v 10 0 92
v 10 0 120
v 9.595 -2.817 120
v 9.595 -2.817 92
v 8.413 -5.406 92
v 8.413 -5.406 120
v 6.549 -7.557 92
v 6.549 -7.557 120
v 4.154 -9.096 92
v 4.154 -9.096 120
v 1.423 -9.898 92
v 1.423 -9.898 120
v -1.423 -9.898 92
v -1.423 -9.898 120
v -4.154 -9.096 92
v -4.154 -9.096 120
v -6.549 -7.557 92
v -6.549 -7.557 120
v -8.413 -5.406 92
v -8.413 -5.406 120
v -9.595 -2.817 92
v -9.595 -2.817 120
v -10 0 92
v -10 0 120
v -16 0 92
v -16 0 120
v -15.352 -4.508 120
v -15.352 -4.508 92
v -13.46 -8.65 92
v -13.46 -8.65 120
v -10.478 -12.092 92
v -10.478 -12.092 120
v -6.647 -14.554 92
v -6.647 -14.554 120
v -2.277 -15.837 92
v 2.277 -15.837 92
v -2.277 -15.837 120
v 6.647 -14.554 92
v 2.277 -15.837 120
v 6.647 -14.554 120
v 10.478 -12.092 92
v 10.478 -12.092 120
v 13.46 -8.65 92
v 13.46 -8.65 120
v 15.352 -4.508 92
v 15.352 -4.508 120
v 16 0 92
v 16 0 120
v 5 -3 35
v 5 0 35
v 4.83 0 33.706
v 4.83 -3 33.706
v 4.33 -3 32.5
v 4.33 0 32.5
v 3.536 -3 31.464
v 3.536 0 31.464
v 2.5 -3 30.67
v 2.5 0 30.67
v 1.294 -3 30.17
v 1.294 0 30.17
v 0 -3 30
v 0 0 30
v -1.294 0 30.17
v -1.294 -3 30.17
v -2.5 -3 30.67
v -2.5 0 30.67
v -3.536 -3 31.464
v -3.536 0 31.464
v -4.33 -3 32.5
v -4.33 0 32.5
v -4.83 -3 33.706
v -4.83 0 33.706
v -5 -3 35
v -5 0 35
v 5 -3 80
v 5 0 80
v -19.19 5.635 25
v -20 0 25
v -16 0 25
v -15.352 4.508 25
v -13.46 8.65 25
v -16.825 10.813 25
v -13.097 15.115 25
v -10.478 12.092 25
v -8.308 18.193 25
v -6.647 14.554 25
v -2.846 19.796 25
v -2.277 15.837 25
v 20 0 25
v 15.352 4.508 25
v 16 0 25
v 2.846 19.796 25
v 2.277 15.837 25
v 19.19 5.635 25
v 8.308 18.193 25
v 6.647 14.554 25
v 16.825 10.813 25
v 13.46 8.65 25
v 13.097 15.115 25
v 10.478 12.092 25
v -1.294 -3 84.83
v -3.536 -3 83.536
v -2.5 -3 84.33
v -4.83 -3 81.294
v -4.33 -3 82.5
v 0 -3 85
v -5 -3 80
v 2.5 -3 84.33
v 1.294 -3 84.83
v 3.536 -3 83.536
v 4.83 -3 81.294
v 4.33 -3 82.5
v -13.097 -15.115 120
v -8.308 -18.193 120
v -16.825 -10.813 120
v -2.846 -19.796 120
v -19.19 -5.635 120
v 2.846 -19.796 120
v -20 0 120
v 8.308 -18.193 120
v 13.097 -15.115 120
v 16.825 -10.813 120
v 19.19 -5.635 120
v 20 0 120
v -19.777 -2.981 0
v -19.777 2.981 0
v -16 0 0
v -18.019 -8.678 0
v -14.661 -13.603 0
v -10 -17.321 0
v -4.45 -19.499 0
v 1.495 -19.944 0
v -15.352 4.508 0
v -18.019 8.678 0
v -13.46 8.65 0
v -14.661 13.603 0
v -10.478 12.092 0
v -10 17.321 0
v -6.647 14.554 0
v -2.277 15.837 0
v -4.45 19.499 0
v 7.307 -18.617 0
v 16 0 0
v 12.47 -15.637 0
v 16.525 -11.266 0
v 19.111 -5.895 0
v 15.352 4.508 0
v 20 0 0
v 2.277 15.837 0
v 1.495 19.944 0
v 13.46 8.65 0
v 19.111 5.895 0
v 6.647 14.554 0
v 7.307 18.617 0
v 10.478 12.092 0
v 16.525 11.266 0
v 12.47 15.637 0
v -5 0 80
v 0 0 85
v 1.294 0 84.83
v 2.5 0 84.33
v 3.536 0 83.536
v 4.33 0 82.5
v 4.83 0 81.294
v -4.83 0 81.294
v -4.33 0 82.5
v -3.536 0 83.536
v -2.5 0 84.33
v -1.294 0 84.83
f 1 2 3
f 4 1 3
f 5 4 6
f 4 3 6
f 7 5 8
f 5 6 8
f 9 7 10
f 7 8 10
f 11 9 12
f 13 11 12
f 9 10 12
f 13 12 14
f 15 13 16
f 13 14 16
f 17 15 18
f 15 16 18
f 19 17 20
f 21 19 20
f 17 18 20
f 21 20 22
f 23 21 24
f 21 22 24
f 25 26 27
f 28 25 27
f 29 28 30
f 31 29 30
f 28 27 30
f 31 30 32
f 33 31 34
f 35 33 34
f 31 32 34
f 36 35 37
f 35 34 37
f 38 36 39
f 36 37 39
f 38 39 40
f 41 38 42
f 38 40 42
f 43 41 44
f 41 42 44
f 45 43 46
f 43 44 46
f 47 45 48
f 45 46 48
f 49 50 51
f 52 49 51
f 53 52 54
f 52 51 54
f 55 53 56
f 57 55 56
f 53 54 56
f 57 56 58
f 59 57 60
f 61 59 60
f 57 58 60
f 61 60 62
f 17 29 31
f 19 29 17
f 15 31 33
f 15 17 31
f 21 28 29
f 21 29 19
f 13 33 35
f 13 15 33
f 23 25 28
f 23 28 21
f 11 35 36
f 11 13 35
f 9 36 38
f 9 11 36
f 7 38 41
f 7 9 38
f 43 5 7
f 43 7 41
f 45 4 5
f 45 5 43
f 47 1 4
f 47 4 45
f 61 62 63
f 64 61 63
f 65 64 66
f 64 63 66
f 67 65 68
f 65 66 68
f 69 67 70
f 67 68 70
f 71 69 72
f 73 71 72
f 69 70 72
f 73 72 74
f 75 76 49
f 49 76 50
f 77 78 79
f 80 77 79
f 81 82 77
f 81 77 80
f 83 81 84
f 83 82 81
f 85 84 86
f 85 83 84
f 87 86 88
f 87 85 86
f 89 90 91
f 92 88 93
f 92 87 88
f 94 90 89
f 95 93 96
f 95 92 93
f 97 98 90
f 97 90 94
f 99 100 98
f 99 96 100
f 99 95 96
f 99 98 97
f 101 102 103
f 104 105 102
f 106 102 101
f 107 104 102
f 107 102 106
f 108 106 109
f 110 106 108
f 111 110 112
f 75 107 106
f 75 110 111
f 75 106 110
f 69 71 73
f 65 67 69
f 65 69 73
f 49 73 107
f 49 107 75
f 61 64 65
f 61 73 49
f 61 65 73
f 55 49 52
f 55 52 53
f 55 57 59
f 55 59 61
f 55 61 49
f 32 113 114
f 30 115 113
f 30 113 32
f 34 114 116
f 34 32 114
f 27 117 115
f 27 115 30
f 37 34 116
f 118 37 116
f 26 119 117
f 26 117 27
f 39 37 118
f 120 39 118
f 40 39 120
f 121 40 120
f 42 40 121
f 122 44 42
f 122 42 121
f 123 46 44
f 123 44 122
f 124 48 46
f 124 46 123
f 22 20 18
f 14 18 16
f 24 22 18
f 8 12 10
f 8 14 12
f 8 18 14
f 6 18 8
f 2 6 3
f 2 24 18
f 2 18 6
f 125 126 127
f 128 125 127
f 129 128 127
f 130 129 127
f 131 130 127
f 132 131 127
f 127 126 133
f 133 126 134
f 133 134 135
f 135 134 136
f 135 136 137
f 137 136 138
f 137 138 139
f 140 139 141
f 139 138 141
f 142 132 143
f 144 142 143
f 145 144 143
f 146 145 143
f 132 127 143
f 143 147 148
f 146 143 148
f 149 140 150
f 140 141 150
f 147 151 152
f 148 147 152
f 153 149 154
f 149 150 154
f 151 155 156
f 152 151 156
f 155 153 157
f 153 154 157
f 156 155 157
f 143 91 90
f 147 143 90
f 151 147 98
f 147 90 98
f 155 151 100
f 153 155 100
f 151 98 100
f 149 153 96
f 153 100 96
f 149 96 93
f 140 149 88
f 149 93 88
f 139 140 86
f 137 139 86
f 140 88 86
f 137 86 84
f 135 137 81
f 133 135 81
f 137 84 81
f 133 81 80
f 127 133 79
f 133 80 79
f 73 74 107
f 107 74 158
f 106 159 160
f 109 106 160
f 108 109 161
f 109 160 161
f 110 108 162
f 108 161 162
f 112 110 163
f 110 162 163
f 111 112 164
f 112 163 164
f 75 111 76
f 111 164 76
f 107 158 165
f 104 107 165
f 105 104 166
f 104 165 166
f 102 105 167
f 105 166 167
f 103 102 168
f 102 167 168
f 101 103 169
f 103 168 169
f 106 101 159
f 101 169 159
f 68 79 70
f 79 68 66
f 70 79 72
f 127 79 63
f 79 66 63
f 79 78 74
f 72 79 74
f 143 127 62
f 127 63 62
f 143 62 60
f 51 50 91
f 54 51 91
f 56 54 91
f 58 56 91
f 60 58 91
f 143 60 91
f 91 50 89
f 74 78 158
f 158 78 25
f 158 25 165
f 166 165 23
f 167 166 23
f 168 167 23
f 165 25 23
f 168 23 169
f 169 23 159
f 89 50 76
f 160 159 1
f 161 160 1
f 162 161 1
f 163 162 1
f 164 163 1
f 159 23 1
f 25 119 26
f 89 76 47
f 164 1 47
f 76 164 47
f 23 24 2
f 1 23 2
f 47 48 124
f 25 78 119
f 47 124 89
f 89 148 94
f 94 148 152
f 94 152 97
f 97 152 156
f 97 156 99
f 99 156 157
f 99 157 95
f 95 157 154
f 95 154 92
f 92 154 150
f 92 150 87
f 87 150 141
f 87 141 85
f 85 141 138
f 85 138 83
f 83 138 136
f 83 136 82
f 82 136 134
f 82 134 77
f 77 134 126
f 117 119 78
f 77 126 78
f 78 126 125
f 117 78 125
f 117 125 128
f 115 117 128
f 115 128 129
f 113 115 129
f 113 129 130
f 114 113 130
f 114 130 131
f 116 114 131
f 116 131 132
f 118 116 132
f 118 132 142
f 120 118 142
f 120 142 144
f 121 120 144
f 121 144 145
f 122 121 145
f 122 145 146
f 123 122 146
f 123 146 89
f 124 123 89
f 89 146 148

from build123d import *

# Parameters (mm, degrees)
SKETCH2_R           = 20
BOSS_EXTRUDE2_DEPTH = 120
SKETCH2_3_R         = 20
BOSS_EXTRUDE3_DEPTH = 120
CUT_EXTRUDE1_START  = -95
CUT_EXTRUDE1_DEPTH  = 95
CUT_EXTRUDE2_DEPTH  = 100.121138008
CUT_EXTRUDE3_DEPTH  = 28
CUT_EXTRUDE4_DEPTH  = 3


with BuildPart() as part:
    # Sketch2 → Boss-Extrude2 (new body)
    with BuildSketch(Plane.XY):
        Circle(SKETCH2_R)
    extrude(amount=BOSS_EXTRUDE2_DEPTH)

    # Sketch2<3> → Boss-Extrude3 (add)
    with BuildSketch(Plane.XY):
        Circle(SKETCH2_3_R)
    extrude(amount=BOSS_EXTRUDE3_DEPTH)

    # Sketch4 → Cut-Extrude1 (cut)
    with BuildSketch(Plane.XY.offset(120).offset(CUT_EXTRUDE1_START)):
        with BuildLine():
            Line((-20, 0), (20, 0))
            ThreePointArc((20, 0), (0, 20), (-20, 0))
        make_face()
    extrude(amount=CUT_EXTRUDE1_DEPTH, mode=Mode.SUBTRACT)

    # Sketch5 → Cut-Extrude2 (cut, through all)
    with BuildSketch(Plane.XY.offset(25)):
        with BuildLine():
            ThreePointArc((16, 0), (0, 16), (-16, 0))
            Line((-16, 0), (16, 0))
        make_face()
    extrude(amount=-CUT_EXTRUDE2_DEPTH, mode=Mode.SUBTRACT)

    # Sketch6 → Cut-Extrude3 (cut)
    with BuildSketch(Plane.XY.offset(120)):
        with BuildLine():
            Line((-10, 0), (-16, 0))
            ThreePointArc((-16, 0), (0, -16), (16, 0))
            Line((16, 0), (10, 0))
            ThreePointArc((10, 0), (0, -10), (-10, 0))
        make_face()
    extrude(amount=-CUT_EXTRUDE3_DEPTH, mode=Mode.SUBTRACT)

    # Sketch7 → Cut-Extrude4 (cut)
    with BuildSketch(Plane(origin=(0, 0, 0), x_dir=(1, 0, 0), z_dir=(0, 1, 0))):
        with BuildLine():
            ThreePointArc((5, -35), (0, -30), (-5, -35))
            Line((-5, -35), (-5, -80))
            ThreePointArc((-5, -80), (0, -85), (5, -80))
            Line((5, -80), (5, -35))
        make_face()
    extrude(amount=-CUT_EXTRUDE4_DEPTH, mode=Mode.SUBTRACT)


solid = part.part
